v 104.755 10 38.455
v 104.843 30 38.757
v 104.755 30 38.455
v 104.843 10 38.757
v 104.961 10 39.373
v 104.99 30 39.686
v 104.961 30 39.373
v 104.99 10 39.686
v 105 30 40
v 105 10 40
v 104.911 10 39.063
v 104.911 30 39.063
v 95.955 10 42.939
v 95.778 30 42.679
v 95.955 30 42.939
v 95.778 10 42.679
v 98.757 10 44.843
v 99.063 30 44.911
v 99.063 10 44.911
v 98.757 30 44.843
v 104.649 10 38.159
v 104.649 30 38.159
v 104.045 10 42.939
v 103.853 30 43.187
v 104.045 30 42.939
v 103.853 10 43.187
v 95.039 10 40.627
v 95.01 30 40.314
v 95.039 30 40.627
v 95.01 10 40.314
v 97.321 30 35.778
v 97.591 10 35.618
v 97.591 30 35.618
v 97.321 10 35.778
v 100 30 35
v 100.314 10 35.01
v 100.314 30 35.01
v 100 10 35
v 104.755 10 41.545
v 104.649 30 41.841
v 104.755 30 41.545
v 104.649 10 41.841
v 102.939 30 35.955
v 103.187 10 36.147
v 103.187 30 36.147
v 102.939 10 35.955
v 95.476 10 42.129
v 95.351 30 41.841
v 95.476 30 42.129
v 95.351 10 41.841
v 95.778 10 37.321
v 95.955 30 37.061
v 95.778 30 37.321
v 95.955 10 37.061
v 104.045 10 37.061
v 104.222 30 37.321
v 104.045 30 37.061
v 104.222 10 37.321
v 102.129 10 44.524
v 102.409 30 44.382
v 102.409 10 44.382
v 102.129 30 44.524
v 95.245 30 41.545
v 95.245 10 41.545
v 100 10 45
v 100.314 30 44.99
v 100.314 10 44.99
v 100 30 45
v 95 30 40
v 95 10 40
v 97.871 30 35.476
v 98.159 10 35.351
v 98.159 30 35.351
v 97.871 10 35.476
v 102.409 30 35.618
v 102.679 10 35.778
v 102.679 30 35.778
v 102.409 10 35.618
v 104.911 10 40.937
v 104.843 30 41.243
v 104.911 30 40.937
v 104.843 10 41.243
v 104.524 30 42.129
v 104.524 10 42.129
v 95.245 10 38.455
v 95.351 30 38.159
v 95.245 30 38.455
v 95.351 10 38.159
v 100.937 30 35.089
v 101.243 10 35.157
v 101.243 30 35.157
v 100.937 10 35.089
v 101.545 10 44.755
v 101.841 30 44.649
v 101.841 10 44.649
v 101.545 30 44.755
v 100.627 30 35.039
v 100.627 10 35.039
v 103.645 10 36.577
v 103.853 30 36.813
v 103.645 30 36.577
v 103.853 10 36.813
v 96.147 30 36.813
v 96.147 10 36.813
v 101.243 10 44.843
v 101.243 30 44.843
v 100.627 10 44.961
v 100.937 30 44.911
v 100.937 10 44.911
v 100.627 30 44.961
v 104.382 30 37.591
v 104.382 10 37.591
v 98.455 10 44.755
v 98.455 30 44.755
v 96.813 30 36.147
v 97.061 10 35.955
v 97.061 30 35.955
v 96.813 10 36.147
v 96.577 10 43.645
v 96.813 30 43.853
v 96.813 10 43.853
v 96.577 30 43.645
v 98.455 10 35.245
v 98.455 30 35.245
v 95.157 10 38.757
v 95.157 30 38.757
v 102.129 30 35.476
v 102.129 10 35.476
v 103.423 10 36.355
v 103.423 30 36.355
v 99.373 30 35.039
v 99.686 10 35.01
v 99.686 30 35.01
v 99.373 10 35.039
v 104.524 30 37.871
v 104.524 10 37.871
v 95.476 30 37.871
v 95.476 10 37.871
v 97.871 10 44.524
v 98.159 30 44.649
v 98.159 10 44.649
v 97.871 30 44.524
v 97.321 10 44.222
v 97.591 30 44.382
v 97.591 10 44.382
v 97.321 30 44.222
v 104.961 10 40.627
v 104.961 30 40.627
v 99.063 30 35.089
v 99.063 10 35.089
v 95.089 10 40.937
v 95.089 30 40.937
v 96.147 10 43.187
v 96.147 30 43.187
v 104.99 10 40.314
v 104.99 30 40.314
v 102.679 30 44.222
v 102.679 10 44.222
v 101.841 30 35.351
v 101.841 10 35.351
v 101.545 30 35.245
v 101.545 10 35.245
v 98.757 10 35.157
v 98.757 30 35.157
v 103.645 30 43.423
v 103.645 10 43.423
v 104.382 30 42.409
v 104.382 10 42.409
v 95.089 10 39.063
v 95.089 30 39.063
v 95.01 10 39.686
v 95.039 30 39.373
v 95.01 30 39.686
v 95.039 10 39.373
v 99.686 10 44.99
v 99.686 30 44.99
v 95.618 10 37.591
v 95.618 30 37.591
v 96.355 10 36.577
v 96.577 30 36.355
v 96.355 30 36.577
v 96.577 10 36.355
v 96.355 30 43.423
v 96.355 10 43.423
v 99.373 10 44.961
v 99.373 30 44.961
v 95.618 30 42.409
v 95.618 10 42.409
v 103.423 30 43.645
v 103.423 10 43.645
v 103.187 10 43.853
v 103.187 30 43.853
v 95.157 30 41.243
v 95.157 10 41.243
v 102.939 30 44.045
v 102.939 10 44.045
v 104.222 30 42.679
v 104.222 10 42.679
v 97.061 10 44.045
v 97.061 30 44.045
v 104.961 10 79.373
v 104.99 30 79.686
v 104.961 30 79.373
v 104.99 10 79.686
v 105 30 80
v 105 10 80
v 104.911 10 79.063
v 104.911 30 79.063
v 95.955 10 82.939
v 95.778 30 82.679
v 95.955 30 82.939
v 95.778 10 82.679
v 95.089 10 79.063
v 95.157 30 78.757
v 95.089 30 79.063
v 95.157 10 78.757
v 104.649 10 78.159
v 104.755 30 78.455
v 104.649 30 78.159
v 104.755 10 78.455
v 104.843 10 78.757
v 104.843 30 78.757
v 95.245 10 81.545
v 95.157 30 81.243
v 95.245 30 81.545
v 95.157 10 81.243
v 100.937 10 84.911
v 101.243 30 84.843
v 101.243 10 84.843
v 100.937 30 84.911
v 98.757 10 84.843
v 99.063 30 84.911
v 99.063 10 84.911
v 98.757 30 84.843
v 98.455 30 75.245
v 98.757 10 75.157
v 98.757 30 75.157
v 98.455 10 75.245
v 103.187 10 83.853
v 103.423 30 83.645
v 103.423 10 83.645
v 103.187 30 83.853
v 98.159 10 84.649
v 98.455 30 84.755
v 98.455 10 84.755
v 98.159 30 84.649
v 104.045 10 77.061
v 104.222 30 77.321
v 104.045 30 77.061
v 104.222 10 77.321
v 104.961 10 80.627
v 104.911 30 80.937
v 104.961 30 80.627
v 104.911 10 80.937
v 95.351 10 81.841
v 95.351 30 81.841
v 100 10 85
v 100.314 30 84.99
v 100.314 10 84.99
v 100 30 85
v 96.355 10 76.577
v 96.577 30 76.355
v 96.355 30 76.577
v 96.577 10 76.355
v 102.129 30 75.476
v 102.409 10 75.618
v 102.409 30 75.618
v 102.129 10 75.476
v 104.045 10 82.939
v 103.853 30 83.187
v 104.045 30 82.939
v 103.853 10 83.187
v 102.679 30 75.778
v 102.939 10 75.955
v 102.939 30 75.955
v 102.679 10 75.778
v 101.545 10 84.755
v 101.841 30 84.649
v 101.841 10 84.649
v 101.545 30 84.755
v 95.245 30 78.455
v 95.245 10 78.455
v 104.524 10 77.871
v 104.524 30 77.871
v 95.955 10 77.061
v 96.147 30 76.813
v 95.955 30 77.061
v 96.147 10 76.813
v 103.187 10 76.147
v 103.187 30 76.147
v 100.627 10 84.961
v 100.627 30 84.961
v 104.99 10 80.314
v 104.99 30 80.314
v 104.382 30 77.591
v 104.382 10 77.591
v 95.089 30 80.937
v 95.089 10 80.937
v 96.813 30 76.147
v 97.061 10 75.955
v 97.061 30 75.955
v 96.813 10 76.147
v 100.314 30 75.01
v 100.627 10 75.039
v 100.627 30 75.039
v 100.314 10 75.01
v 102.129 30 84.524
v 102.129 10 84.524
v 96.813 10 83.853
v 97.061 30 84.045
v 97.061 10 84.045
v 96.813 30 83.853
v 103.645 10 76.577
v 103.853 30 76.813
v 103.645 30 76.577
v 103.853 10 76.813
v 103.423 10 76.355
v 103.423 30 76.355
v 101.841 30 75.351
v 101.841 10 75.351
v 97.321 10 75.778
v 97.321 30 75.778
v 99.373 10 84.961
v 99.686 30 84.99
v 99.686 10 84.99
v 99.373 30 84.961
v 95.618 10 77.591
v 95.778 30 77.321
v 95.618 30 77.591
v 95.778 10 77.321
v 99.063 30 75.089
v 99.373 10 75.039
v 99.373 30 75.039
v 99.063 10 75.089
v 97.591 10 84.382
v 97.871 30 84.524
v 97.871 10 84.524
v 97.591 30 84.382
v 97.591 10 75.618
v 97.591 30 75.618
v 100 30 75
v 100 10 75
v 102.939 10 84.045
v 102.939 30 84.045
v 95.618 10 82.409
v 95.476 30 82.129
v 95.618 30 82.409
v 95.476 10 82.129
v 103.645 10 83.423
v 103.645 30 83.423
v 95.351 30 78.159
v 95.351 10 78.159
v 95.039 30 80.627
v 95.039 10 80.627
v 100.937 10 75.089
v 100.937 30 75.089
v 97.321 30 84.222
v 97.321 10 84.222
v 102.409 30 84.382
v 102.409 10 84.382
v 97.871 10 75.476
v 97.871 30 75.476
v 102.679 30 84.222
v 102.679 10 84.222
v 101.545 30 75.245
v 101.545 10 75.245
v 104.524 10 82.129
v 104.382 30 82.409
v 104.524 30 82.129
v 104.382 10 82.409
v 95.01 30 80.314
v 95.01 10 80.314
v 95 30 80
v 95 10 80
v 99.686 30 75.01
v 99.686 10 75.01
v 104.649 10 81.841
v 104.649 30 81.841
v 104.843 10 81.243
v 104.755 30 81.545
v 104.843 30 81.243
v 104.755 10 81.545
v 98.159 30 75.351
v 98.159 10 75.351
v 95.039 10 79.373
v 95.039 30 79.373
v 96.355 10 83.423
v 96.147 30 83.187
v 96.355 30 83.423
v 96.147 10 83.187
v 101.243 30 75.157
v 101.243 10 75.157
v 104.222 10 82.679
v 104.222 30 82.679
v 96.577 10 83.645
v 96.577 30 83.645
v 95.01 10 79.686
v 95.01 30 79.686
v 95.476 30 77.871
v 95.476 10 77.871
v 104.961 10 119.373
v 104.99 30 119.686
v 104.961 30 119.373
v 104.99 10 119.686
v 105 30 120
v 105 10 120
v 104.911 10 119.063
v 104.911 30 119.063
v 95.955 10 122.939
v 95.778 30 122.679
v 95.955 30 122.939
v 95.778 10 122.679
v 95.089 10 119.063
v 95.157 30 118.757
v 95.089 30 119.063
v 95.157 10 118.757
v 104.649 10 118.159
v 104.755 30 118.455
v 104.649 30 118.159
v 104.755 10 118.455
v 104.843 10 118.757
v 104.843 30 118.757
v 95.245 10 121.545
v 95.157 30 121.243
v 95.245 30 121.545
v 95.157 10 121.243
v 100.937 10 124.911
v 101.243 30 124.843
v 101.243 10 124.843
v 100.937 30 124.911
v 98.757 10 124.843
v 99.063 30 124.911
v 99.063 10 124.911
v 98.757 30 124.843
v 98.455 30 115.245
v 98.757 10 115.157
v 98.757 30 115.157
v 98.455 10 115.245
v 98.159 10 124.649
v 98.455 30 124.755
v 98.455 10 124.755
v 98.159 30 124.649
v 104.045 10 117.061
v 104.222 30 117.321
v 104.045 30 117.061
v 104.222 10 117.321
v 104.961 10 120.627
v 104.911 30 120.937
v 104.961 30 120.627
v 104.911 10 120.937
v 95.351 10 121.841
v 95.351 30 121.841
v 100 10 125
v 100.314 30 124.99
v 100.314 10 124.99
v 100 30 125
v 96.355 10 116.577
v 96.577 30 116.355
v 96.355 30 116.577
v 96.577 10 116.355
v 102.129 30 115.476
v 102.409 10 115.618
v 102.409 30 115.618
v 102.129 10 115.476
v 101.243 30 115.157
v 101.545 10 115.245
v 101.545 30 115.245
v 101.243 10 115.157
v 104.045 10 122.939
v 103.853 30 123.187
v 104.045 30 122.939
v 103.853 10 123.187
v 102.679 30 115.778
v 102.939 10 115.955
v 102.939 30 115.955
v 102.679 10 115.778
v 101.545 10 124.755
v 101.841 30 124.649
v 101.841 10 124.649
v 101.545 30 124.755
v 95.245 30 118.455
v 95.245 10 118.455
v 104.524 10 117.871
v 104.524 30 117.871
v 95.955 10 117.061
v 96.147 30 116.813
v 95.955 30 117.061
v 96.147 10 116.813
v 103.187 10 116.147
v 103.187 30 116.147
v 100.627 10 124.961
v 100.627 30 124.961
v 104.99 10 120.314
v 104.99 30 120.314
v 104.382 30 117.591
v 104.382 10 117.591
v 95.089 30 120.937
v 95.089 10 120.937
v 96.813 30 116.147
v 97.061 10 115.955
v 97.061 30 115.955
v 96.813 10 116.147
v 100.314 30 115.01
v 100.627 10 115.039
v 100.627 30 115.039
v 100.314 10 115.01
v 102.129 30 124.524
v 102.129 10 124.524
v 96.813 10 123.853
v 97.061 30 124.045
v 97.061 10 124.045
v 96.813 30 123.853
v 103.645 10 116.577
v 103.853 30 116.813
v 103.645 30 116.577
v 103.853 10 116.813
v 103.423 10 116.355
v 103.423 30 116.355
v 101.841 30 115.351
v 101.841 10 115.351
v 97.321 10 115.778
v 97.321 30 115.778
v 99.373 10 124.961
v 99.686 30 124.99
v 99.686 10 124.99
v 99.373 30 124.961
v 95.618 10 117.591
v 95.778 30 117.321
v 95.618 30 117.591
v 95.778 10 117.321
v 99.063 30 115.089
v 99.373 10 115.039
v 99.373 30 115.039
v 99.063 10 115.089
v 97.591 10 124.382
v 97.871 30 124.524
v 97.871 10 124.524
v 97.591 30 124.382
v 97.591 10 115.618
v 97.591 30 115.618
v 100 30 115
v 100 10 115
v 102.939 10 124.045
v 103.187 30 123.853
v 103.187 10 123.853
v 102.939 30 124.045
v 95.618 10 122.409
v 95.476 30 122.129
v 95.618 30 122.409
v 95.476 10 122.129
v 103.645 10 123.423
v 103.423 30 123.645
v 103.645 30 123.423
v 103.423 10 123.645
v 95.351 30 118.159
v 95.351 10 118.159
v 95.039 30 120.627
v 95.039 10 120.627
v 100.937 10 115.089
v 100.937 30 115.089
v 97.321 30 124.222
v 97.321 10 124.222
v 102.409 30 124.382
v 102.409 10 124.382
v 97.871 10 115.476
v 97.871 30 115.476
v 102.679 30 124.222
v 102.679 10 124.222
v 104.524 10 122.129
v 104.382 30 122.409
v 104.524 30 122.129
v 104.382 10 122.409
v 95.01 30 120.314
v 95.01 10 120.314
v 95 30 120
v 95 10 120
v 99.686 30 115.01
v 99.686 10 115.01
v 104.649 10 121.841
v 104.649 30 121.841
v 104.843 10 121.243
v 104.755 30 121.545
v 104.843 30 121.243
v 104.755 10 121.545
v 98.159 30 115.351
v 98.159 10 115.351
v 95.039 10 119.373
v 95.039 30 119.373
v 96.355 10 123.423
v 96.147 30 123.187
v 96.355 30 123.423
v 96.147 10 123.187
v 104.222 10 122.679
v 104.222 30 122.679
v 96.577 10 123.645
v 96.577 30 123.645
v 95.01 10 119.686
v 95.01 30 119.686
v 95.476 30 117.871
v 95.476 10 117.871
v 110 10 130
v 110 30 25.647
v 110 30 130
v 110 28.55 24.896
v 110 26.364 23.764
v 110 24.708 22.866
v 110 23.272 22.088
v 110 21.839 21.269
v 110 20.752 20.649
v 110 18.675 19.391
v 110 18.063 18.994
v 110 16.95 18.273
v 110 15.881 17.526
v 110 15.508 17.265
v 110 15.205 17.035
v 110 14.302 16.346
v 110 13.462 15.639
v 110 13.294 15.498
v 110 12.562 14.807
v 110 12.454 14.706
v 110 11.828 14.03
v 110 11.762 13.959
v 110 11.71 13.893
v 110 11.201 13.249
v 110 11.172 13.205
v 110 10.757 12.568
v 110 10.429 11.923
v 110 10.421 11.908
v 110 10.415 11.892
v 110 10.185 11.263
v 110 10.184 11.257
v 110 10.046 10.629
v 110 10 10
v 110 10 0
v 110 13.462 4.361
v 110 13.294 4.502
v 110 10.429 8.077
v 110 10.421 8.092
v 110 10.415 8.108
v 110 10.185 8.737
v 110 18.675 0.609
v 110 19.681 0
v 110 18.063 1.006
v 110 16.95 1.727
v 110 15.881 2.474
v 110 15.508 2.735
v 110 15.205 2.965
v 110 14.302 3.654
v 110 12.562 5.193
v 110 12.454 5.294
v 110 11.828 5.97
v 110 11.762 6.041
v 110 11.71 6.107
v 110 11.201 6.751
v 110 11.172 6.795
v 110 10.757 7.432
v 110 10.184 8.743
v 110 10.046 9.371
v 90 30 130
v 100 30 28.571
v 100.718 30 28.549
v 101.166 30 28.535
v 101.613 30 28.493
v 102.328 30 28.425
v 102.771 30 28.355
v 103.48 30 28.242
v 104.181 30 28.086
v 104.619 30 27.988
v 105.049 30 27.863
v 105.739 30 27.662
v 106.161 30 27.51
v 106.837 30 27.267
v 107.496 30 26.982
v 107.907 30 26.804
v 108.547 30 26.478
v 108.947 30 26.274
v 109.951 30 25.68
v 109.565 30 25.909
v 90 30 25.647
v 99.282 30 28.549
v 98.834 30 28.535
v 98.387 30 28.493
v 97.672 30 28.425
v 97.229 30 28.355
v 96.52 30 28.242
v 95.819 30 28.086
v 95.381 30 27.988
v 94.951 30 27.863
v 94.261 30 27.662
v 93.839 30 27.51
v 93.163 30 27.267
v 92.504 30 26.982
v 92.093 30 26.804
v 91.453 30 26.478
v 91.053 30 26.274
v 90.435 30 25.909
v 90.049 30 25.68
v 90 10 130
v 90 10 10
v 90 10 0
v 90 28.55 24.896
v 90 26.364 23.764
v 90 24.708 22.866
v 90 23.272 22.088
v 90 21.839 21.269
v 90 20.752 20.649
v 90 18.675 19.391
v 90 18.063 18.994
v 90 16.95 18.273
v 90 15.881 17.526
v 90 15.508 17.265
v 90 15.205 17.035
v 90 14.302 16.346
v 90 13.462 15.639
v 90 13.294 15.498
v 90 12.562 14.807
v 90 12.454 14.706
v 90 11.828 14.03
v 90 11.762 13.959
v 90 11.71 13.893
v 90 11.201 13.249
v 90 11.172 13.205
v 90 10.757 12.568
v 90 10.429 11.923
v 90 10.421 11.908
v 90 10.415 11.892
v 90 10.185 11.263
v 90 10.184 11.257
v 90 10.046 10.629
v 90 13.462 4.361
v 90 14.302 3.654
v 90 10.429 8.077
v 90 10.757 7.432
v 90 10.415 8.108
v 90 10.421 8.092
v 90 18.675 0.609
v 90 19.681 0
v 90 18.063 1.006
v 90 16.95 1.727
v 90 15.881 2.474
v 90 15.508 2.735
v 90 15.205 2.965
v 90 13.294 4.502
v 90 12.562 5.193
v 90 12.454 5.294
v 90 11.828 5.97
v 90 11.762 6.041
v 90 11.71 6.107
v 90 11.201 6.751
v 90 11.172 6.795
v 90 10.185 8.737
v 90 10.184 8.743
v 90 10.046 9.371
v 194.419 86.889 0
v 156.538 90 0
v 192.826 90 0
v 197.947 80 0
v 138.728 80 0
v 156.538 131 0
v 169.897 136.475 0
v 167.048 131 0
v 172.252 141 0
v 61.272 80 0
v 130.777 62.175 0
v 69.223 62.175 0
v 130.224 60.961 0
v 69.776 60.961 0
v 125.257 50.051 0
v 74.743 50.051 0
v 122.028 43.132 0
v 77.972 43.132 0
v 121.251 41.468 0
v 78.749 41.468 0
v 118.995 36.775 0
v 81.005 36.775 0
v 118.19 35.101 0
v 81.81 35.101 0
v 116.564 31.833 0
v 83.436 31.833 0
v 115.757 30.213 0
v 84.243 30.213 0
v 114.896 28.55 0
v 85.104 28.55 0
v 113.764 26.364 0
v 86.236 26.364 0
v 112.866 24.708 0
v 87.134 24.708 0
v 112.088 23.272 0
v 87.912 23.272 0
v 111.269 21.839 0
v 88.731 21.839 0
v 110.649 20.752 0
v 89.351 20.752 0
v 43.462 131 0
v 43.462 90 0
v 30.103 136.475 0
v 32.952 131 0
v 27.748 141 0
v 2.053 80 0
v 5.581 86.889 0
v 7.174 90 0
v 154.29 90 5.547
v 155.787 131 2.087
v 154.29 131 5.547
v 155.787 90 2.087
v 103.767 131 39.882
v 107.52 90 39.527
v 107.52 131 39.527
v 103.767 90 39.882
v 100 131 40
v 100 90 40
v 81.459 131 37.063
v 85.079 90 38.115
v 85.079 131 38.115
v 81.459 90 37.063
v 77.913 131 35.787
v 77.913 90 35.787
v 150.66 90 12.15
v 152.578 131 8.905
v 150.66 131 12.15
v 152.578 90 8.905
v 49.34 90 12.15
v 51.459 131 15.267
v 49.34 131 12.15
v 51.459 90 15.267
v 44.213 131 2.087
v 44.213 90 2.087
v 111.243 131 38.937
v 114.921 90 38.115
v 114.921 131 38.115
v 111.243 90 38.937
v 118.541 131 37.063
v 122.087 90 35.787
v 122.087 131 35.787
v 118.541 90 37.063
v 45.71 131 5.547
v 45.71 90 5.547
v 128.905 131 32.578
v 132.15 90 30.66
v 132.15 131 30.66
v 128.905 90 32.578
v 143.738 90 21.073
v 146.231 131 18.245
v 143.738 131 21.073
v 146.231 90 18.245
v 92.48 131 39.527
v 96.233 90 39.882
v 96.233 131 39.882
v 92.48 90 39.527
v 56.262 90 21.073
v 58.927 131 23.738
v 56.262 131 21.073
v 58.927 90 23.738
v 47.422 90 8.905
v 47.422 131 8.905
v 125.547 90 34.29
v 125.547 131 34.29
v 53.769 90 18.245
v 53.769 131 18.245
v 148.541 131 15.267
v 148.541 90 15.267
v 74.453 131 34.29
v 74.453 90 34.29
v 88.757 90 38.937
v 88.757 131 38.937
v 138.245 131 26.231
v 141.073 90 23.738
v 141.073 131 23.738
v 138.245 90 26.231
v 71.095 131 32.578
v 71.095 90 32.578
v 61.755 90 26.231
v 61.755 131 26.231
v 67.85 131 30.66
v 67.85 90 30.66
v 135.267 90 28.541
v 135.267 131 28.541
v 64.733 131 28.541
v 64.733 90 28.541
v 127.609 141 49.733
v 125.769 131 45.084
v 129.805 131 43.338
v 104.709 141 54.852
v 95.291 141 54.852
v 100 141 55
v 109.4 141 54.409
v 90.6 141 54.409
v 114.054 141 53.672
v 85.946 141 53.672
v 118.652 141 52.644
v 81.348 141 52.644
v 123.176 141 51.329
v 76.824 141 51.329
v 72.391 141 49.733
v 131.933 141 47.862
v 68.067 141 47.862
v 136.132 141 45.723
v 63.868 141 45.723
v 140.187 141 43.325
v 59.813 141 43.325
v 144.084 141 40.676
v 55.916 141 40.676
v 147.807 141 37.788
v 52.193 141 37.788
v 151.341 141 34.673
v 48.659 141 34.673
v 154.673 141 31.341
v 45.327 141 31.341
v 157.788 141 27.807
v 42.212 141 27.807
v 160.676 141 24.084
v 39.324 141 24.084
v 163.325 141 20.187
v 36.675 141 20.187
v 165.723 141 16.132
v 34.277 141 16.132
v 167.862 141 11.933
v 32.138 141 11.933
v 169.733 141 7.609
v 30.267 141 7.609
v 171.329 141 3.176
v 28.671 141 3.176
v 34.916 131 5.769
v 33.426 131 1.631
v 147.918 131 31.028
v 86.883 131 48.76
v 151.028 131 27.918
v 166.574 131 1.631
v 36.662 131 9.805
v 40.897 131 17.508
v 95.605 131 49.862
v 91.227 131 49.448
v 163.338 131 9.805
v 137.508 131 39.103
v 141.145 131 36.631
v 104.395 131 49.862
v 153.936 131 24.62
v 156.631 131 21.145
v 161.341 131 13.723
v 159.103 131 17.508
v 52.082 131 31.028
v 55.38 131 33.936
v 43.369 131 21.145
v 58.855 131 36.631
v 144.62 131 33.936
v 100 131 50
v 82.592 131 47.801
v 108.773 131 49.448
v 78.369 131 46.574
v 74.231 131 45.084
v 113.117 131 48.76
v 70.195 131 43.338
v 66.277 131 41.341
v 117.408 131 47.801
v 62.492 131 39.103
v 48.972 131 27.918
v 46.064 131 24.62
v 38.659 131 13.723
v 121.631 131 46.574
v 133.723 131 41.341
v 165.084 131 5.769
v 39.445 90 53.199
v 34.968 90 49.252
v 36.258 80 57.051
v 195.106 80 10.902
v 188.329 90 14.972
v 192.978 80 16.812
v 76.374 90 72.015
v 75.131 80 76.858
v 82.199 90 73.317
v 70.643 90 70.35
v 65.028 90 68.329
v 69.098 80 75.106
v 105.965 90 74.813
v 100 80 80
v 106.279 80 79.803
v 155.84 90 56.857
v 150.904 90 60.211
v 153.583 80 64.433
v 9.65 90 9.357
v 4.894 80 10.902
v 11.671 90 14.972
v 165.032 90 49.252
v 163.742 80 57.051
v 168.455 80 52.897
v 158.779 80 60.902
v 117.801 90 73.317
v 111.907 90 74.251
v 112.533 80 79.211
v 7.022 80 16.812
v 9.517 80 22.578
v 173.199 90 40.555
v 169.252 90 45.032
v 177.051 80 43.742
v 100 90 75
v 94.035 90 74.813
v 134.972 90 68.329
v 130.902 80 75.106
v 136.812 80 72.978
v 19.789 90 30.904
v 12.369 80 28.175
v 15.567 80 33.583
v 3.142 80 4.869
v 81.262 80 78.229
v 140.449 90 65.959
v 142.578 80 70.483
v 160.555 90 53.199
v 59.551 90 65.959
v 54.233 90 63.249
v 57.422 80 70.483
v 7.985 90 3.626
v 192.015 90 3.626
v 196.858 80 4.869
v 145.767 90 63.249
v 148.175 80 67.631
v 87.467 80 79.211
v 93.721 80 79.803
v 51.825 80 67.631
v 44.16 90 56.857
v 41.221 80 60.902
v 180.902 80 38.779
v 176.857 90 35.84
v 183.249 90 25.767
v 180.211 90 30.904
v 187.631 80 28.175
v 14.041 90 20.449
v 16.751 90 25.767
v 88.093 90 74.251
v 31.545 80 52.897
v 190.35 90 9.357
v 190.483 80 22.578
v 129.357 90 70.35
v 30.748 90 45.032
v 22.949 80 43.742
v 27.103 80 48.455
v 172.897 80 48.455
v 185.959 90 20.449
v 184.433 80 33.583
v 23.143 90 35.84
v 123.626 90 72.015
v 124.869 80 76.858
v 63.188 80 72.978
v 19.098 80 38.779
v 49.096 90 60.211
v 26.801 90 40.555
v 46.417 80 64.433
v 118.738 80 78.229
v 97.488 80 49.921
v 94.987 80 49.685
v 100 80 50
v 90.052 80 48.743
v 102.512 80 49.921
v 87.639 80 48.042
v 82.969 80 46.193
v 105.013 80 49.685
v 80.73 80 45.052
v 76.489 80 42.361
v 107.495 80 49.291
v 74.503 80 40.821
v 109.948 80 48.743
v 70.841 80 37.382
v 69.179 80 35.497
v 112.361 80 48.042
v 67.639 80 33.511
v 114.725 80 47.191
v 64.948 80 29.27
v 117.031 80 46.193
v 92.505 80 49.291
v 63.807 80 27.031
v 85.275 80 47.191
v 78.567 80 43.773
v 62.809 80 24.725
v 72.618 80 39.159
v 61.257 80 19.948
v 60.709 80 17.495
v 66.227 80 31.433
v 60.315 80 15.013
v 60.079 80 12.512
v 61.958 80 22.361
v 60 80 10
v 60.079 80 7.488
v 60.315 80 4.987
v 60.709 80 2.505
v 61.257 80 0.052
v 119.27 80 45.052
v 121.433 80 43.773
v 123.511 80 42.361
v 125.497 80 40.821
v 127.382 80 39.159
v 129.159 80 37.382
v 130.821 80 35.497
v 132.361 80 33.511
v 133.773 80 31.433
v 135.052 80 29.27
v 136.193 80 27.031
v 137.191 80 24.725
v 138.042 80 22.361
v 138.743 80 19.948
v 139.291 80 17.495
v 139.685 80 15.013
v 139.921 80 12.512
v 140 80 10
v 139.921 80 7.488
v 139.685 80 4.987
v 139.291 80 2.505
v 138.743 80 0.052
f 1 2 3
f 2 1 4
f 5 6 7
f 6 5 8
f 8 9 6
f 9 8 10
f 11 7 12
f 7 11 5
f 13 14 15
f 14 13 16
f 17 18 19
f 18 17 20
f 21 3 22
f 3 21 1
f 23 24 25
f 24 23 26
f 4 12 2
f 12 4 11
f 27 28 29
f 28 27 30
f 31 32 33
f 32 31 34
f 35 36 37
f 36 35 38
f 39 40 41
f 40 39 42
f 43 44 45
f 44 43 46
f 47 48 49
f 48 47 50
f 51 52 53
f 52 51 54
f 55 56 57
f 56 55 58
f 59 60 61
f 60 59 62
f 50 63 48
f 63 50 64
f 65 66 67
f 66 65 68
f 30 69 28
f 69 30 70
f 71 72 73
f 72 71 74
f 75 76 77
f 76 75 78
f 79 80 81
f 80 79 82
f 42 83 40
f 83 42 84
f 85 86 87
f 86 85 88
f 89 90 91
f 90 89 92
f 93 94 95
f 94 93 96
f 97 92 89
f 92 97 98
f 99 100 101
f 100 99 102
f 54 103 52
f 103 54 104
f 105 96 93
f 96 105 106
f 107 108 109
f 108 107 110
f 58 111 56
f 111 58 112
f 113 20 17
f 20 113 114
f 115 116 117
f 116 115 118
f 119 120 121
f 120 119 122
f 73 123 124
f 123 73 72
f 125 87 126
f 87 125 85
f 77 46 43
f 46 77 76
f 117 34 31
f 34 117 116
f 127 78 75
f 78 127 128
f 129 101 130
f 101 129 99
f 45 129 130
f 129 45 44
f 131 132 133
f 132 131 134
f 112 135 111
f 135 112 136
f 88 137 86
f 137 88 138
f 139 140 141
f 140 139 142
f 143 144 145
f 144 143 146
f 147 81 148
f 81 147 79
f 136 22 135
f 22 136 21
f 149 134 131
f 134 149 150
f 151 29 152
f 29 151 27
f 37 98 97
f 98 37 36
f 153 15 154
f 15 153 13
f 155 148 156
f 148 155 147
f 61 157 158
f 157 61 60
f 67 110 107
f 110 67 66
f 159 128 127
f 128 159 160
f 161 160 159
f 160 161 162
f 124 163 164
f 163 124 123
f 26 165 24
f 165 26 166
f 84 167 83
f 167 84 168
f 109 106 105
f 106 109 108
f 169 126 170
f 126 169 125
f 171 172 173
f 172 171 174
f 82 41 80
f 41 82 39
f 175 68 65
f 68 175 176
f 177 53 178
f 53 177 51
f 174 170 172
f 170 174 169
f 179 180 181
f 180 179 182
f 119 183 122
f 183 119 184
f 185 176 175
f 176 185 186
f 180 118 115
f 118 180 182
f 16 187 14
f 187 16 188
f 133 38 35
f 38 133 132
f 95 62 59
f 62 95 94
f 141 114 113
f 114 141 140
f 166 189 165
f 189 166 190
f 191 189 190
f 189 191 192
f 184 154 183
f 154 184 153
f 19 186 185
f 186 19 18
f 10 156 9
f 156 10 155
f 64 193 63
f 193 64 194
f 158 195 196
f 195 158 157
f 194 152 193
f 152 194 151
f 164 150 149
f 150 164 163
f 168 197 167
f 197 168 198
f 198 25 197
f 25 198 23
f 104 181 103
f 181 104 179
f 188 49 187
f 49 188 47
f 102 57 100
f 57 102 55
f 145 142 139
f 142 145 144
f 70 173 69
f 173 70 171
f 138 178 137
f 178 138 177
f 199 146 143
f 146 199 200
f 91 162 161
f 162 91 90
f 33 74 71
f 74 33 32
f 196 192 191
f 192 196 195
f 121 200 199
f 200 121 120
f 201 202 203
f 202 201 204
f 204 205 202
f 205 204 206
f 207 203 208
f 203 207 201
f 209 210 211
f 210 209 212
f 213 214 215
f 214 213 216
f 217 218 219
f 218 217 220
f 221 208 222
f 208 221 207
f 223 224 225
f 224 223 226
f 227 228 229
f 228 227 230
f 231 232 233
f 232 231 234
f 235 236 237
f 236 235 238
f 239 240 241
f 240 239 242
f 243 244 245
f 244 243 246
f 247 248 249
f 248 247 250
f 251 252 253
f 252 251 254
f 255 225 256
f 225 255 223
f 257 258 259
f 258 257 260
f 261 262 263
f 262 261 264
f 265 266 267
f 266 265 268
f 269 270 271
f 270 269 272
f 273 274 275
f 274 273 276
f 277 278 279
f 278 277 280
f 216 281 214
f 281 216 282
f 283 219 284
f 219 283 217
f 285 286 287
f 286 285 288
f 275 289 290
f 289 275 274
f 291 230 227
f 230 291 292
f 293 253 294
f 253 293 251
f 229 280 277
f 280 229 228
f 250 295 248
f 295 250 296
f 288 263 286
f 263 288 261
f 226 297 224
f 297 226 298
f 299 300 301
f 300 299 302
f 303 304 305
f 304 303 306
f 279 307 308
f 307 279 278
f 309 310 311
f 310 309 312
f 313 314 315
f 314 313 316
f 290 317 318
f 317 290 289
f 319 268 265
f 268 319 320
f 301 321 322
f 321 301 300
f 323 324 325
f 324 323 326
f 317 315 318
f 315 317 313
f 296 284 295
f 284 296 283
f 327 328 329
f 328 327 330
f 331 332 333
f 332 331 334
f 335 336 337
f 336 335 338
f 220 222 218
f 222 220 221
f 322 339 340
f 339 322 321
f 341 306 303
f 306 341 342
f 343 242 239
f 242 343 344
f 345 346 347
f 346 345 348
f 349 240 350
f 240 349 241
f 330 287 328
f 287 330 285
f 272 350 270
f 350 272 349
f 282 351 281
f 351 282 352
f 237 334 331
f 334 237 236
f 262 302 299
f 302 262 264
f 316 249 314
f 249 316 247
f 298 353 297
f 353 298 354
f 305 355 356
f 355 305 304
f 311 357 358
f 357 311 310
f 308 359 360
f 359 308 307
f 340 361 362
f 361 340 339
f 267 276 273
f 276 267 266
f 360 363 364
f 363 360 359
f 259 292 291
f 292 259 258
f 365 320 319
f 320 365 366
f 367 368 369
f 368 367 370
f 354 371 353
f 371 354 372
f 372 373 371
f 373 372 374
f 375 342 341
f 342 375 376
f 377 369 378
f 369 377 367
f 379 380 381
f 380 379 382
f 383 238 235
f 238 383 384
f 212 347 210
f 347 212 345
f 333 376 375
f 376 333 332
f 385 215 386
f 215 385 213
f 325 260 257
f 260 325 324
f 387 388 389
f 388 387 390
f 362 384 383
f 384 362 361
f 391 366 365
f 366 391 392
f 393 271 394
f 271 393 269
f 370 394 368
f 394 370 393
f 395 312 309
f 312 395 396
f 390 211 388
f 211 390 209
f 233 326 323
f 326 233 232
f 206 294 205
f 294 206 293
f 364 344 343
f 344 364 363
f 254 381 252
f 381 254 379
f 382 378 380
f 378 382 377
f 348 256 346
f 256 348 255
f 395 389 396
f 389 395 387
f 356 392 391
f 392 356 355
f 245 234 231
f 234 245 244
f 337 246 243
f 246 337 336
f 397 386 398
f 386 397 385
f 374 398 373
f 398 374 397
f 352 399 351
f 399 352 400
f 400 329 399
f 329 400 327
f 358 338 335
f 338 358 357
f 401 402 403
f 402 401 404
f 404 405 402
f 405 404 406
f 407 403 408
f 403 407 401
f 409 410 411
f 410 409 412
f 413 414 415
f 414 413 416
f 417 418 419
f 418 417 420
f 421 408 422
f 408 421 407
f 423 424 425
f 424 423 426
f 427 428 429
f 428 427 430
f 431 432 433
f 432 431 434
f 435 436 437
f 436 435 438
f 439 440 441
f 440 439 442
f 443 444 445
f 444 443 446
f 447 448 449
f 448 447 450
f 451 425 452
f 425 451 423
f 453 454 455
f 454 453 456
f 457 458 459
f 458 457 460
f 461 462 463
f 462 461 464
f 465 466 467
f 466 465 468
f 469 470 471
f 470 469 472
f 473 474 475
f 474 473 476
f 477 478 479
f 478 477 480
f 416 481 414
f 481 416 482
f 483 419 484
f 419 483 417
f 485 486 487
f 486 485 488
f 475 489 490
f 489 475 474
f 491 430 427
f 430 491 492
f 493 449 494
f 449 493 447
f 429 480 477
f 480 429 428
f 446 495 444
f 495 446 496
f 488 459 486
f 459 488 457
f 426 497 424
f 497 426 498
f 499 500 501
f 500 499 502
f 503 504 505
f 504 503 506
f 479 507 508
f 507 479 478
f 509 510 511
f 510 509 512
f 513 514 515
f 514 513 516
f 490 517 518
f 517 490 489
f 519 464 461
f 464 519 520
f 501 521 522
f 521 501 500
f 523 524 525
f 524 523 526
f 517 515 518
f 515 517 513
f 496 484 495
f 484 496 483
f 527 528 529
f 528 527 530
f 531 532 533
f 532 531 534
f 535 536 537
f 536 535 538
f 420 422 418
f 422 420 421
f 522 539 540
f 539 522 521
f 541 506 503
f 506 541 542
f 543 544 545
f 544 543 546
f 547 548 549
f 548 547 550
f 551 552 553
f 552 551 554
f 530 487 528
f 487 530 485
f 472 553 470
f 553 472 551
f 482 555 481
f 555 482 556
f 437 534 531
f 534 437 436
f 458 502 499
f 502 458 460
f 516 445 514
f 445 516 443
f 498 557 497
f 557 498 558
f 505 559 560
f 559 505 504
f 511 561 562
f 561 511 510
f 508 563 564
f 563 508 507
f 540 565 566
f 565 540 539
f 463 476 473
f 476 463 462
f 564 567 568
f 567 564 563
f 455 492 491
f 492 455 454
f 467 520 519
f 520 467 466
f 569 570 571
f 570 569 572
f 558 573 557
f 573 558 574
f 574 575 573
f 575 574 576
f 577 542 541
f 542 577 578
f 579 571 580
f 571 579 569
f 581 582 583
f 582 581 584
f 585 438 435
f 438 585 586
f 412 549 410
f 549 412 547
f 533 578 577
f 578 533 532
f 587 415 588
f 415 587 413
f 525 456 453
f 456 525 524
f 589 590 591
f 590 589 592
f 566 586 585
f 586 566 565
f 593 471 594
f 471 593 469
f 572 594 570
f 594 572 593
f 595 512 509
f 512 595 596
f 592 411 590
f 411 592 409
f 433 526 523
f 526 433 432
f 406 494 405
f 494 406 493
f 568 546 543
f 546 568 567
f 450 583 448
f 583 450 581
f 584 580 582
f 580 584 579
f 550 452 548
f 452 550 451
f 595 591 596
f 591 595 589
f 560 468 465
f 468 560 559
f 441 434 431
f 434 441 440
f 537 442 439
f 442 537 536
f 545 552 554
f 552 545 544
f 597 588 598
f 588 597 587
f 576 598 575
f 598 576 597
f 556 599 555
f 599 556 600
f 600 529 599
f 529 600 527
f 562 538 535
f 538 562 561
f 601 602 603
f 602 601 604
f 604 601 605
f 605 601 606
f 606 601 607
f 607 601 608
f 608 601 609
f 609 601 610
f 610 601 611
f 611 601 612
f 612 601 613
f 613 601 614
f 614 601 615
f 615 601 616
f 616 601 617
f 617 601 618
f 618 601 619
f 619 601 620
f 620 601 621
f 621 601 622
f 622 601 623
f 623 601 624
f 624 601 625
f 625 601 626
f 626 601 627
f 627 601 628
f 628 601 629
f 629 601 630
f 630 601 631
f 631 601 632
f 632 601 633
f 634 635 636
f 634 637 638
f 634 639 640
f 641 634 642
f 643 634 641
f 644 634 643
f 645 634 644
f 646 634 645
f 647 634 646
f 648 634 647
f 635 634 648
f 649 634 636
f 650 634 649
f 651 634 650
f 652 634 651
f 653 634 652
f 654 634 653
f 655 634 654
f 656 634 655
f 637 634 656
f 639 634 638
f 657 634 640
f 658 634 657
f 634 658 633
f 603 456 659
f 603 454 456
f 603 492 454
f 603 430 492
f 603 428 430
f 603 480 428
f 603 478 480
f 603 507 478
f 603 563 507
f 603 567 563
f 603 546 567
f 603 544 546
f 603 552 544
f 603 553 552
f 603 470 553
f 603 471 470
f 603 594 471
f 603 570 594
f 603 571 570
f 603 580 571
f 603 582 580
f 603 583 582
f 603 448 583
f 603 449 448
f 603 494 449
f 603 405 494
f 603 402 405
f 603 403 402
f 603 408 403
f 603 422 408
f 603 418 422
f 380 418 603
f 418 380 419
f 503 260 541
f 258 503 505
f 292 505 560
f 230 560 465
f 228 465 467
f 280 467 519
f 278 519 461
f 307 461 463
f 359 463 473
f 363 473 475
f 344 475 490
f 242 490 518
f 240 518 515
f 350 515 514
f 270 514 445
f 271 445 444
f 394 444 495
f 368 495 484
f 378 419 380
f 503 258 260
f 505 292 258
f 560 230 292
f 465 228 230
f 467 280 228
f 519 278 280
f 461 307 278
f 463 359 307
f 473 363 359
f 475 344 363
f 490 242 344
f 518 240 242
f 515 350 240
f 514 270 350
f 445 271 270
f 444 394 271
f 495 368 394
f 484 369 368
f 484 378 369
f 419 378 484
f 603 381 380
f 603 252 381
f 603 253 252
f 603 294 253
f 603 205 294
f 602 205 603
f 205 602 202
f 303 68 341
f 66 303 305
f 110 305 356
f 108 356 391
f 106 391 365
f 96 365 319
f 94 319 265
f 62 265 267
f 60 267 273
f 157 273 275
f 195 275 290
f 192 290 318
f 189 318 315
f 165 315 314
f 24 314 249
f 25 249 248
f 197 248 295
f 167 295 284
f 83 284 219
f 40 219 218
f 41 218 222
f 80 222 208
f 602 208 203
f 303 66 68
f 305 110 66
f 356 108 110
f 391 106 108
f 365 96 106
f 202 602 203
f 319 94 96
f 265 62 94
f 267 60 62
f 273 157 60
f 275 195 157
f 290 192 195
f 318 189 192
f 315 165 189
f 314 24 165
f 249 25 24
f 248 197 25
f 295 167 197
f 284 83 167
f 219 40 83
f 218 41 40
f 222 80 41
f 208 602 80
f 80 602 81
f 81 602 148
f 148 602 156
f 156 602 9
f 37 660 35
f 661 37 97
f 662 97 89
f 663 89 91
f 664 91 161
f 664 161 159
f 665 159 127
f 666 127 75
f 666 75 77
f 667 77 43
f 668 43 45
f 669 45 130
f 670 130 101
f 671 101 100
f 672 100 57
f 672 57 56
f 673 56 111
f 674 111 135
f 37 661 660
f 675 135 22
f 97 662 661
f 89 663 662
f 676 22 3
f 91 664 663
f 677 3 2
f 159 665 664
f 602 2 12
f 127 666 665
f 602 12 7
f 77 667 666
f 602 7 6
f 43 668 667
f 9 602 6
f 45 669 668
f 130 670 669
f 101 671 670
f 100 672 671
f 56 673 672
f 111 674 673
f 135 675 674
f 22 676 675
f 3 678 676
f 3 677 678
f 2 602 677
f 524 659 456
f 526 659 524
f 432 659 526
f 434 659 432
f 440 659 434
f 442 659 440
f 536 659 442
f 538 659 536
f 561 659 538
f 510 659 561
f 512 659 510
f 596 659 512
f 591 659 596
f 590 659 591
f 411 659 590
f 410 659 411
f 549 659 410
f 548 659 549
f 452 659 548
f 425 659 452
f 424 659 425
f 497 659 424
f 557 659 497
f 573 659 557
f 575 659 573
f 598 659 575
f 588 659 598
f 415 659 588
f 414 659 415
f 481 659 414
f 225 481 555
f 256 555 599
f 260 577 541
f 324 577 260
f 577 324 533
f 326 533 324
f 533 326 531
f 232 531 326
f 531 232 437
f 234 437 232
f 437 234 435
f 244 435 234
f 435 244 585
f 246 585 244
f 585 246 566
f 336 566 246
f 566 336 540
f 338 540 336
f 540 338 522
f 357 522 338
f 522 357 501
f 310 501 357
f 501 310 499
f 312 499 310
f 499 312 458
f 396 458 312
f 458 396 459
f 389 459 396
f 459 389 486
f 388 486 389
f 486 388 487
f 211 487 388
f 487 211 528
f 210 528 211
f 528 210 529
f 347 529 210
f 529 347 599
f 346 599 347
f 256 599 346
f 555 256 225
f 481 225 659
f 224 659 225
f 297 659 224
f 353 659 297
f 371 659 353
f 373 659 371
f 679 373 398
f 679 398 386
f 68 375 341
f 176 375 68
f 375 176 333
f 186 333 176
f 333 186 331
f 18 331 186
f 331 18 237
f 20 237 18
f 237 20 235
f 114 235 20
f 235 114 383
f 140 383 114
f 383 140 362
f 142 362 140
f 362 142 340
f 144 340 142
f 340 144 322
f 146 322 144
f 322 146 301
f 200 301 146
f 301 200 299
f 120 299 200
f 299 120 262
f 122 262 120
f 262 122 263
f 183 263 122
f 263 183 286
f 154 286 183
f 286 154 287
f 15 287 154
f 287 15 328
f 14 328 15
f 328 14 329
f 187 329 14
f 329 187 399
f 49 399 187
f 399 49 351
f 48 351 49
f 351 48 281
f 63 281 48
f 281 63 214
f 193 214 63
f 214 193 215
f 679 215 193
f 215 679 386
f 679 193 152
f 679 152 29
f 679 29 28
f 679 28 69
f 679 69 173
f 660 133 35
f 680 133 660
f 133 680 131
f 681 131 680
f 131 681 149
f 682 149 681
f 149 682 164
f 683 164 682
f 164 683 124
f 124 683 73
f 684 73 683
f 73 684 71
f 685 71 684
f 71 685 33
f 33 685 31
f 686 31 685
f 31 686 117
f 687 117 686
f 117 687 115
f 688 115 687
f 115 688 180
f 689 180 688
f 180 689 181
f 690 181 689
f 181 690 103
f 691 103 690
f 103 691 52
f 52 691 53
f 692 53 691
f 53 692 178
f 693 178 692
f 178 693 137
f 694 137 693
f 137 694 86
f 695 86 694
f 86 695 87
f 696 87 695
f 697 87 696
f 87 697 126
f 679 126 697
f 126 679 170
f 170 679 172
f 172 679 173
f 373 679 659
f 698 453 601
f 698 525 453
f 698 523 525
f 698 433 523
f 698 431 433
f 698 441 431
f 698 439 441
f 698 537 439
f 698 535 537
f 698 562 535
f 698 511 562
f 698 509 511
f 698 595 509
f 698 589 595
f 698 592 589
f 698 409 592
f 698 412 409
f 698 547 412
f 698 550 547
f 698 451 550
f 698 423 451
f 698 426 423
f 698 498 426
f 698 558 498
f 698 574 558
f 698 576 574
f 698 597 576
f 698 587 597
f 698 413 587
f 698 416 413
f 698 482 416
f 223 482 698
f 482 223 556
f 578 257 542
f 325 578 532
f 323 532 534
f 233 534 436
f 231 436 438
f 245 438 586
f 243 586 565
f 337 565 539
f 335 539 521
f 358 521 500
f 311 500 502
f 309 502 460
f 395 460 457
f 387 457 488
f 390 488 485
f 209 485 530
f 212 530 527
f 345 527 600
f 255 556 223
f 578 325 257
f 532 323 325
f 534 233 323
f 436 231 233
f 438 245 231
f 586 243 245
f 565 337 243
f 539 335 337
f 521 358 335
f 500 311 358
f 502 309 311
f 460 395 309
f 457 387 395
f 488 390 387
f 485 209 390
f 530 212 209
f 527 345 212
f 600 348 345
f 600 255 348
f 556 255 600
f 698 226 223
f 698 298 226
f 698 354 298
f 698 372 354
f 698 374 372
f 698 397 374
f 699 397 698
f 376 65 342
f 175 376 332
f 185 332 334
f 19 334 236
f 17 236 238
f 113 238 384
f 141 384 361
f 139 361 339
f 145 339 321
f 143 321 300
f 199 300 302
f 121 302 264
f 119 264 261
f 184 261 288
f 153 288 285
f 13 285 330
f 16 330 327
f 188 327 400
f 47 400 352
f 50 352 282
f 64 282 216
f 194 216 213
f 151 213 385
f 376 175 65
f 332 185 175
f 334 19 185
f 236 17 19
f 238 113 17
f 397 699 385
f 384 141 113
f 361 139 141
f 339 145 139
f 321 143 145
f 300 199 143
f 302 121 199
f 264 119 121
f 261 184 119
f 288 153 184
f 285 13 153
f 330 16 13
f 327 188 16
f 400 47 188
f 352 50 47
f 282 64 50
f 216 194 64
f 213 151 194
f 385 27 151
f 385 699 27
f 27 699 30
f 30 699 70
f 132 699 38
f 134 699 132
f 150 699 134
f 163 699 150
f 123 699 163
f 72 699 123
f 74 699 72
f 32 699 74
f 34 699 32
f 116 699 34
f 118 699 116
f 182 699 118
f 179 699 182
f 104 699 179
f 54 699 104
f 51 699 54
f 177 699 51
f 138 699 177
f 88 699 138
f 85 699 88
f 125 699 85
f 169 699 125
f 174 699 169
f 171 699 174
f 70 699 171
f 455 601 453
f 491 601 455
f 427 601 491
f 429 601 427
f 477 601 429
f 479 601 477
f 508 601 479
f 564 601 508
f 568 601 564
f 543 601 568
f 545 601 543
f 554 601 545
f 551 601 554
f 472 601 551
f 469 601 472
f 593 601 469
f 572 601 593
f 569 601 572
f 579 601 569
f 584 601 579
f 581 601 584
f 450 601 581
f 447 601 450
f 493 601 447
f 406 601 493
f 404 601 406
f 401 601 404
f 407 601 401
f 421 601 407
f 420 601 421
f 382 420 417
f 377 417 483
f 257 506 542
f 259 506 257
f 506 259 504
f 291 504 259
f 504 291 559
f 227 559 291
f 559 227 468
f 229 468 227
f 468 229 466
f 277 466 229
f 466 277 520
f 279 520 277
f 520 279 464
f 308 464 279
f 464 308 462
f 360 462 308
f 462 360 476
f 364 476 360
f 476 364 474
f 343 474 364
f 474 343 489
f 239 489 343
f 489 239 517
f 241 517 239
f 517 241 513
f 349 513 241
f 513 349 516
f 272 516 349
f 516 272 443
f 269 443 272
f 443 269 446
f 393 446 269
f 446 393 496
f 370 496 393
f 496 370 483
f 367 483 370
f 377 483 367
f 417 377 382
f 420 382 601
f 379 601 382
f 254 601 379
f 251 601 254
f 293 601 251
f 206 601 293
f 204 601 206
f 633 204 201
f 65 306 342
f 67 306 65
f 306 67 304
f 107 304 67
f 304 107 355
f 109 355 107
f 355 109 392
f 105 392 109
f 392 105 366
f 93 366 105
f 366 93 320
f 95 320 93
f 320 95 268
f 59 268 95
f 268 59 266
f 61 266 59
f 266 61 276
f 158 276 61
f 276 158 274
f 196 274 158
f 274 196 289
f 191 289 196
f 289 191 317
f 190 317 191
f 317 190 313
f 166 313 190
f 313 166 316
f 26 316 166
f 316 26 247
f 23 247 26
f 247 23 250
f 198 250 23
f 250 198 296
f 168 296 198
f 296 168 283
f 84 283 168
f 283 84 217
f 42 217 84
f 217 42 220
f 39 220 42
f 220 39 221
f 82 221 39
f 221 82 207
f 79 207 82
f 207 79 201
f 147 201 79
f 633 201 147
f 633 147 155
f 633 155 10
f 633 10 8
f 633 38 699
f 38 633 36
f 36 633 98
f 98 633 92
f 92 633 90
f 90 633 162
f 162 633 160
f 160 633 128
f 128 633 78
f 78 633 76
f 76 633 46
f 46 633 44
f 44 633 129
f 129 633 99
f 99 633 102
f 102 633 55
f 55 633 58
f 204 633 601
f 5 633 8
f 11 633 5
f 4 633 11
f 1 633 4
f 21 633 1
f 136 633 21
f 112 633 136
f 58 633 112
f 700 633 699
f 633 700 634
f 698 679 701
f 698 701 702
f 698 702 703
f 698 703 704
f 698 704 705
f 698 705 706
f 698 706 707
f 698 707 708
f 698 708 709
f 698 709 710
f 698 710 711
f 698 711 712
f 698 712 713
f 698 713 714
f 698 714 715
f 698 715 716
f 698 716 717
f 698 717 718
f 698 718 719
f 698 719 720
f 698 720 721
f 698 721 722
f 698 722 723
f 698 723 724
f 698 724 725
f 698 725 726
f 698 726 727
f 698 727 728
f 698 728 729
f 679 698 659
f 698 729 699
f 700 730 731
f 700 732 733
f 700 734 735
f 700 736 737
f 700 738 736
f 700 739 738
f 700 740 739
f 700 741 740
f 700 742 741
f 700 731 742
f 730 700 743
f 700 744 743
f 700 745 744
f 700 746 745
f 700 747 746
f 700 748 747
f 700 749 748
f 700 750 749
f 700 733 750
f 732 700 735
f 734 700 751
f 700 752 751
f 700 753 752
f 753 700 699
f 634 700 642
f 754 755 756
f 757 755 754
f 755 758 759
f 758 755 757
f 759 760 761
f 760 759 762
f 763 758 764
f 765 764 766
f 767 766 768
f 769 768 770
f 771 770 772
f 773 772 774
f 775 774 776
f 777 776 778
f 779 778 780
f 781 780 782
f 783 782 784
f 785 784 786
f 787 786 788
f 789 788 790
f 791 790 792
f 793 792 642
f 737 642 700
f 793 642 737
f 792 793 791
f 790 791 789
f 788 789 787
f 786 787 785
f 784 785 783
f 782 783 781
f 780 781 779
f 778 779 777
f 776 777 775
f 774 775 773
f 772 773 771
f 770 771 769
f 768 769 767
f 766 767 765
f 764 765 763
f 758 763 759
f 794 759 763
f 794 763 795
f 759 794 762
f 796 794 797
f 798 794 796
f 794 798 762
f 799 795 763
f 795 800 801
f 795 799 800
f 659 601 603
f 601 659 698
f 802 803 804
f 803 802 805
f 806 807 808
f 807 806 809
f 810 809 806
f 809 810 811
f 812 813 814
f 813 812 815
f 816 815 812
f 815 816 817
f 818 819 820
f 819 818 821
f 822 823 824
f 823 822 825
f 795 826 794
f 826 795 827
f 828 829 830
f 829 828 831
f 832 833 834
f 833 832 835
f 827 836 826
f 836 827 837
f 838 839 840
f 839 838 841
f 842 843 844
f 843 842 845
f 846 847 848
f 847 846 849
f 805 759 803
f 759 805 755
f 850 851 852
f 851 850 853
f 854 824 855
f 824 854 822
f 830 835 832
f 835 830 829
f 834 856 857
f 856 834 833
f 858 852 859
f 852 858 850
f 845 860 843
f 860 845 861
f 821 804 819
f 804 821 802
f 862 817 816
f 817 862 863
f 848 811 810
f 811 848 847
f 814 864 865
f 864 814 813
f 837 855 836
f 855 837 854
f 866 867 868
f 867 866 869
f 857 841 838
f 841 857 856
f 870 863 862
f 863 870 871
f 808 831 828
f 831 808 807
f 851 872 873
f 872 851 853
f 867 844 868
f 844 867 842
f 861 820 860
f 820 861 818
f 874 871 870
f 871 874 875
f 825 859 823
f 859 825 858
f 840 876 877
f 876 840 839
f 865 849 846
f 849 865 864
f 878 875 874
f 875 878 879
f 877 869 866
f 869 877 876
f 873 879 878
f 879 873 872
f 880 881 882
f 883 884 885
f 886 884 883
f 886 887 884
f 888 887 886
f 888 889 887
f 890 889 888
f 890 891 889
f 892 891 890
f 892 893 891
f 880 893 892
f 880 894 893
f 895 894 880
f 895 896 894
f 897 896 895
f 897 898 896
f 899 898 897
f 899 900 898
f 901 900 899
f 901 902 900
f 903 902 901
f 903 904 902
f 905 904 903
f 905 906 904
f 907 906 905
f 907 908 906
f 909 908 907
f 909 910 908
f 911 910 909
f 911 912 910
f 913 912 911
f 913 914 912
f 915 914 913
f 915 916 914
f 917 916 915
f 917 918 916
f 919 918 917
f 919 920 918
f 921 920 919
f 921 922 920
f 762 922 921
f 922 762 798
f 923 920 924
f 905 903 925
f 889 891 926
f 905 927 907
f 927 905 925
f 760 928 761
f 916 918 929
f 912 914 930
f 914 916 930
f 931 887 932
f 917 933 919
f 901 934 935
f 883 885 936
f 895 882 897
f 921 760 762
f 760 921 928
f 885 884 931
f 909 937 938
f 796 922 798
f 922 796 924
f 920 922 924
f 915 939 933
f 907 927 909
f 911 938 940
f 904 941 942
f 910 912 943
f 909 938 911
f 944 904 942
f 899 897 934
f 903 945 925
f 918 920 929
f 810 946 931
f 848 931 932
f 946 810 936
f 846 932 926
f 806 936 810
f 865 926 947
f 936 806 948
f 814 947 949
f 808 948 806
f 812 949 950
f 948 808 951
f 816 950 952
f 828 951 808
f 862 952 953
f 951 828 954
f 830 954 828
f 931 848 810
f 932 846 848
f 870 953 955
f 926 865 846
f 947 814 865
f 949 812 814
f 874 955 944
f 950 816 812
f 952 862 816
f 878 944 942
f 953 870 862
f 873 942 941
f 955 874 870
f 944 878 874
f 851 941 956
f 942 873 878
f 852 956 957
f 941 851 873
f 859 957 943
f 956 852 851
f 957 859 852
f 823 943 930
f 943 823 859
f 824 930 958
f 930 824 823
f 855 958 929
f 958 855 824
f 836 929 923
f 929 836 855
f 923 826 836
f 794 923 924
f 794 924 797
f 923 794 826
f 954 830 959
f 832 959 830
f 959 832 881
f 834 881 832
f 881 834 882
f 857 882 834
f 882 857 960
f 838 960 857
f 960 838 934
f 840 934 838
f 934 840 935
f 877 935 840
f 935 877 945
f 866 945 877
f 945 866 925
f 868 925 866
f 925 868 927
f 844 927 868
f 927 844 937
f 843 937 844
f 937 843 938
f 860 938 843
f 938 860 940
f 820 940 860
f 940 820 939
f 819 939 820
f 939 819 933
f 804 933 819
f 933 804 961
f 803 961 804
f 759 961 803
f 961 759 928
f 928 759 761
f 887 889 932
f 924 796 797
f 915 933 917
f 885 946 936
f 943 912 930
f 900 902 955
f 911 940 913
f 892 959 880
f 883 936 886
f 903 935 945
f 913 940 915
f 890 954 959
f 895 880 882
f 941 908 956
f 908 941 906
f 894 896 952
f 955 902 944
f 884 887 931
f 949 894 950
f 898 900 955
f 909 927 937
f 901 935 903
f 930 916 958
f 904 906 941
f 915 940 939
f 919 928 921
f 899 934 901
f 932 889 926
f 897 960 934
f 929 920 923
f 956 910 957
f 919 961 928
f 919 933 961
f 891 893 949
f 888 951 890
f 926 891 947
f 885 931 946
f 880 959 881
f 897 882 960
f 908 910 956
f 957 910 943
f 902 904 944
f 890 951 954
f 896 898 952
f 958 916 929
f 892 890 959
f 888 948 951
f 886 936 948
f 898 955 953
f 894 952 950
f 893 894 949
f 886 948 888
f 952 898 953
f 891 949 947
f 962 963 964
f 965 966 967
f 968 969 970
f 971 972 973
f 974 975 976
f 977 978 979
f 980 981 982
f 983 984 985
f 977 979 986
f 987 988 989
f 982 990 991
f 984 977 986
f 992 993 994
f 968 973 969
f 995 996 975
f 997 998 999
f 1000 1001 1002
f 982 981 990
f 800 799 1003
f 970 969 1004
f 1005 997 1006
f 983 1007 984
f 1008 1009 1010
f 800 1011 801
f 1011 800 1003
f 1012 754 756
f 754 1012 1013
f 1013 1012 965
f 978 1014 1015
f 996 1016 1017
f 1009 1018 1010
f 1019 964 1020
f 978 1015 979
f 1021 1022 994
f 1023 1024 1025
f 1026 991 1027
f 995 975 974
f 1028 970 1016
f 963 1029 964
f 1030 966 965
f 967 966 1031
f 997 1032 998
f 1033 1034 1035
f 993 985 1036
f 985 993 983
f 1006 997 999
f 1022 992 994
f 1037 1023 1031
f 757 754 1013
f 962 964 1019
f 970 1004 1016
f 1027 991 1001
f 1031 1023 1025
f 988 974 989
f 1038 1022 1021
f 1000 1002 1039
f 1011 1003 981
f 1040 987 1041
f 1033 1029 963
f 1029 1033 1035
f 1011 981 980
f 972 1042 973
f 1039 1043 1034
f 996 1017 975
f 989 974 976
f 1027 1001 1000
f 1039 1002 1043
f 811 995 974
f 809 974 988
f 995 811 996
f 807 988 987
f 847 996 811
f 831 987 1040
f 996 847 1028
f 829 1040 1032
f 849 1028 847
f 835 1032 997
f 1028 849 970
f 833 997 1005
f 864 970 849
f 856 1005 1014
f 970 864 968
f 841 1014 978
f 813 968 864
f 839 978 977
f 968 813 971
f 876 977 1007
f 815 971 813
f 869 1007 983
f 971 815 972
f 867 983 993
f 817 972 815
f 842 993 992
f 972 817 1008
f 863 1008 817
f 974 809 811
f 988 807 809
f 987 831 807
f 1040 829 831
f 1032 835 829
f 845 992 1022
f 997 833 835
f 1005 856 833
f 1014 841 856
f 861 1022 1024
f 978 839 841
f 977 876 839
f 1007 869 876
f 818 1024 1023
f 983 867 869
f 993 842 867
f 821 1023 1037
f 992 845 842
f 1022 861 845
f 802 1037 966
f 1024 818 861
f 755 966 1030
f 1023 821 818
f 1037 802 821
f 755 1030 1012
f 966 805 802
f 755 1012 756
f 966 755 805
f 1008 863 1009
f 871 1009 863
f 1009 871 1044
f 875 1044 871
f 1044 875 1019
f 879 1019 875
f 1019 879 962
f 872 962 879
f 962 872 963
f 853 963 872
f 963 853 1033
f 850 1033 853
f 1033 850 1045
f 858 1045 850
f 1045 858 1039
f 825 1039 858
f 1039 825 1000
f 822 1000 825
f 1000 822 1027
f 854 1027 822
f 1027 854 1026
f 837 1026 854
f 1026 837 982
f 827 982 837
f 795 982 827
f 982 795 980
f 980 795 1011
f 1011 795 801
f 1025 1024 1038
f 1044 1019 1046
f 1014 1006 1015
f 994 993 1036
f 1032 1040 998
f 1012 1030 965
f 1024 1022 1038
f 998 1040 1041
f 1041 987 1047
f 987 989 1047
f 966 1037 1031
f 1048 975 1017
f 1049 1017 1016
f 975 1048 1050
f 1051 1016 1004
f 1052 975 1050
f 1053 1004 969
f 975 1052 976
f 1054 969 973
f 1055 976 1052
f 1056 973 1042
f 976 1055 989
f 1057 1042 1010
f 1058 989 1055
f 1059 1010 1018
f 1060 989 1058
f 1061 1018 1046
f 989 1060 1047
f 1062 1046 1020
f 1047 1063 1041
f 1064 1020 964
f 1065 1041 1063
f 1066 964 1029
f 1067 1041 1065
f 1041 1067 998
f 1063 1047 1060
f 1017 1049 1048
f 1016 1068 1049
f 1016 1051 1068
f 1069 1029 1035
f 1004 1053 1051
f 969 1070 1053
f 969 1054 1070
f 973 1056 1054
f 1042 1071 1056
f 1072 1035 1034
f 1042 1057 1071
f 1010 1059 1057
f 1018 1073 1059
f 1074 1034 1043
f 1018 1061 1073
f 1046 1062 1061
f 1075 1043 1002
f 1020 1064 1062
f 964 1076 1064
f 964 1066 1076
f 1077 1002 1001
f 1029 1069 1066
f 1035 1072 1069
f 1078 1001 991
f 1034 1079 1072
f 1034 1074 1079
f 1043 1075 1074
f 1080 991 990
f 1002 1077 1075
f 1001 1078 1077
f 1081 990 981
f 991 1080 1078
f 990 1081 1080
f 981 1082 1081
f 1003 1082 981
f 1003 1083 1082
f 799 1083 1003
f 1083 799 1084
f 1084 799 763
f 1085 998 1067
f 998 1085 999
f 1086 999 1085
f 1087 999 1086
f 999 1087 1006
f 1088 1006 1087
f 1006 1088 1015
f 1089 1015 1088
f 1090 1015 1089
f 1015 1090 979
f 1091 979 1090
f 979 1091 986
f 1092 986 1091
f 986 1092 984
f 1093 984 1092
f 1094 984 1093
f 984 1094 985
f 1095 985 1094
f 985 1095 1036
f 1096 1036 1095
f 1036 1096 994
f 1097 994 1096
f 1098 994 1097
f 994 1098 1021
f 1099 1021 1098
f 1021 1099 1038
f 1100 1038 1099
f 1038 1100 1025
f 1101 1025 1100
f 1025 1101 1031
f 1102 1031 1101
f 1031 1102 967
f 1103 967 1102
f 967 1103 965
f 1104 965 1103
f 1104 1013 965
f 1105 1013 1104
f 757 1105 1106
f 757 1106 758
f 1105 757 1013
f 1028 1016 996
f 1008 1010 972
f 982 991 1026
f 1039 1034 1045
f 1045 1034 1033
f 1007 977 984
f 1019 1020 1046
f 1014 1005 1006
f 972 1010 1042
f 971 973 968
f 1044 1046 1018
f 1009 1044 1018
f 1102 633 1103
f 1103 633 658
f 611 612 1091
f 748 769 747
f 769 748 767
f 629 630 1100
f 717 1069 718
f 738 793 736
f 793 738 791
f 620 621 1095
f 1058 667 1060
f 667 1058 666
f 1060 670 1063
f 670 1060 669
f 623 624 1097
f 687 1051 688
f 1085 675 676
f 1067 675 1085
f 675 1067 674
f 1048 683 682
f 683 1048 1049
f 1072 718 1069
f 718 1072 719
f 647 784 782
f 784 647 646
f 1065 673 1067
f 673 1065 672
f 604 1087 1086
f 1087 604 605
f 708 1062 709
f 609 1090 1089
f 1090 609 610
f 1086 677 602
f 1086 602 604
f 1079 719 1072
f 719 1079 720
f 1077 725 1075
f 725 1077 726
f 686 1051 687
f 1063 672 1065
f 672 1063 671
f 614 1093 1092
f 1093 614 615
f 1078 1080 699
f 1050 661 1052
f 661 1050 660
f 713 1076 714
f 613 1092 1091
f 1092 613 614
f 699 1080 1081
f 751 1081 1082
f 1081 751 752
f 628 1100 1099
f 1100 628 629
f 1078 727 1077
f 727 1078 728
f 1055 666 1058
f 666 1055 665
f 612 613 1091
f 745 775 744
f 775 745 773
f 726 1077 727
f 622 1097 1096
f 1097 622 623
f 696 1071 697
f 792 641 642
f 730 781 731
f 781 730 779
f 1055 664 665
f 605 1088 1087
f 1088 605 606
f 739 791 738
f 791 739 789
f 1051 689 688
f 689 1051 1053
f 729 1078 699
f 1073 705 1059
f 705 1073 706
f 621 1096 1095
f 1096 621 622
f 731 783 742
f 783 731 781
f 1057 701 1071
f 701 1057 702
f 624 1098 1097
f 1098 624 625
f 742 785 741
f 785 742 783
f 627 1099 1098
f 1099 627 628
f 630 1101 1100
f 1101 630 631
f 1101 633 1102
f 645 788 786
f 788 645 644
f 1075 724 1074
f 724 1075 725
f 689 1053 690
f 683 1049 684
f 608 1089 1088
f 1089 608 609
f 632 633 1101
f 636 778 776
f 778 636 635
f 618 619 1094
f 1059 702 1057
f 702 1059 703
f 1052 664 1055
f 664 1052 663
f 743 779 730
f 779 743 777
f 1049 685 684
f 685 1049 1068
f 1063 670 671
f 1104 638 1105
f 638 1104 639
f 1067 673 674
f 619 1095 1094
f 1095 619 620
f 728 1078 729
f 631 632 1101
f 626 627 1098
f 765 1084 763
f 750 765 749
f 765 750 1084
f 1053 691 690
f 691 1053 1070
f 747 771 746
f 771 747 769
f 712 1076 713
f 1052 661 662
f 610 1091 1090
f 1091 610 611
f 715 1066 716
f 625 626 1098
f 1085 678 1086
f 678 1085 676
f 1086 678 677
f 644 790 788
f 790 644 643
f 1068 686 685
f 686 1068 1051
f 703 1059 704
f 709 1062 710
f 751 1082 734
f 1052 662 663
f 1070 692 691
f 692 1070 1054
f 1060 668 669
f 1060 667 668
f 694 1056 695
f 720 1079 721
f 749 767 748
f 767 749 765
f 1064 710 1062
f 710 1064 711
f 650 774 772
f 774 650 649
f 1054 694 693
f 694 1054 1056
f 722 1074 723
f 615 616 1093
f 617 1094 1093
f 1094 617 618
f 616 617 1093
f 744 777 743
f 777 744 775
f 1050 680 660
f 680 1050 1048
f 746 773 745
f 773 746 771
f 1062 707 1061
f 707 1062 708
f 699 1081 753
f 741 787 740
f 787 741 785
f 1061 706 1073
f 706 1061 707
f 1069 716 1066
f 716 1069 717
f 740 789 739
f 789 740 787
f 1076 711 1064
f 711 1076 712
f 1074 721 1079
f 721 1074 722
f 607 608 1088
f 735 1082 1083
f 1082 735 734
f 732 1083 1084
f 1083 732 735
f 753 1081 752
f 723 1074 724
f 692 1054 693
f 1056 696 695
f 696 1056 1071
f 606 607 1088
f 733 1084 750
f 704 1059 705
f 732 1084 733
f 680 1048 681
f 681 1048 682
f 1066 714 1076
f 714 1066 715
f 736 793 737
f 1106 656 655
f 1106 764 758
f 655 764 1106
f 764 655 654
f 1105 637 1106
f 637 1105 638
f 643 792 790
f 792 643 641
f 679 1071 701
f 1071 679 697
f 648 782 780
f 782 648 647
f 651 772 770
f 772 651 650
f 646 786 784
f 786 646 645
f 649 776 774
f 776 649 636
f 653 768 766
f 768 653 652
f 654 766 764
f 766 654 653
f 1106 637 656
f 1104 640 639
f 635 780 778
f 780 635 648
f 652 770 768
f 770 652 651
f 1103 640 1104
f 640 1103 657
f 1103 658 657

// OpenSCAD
$fn = 100;

translate([100,10,0])
difference()
{
rotate([-90,0,0])
{
difference()
{

    translate([0,-65,10])
        cube([20,130, 20], center=true);
    
    translate([0,-40,0])
    union()
    {
        cylinder(50, r=5, center=true);
        
        translate([0,-40,0])
            cylinder(50, r=5, center = true);
        
        translate([0,-80,0])
            cylinder(50, r=5, center = true);
                
        
    }
    
}

    translate([0,-10,35])
        cylinder(70,r2=40,r1=10,center=true);
difference()
{
    translate([0,20,65])
    union()
    {
        {
            color("indigo",1.0)
            cylinder(130, r=60, center=true);
        }
        
        translate([0,0,61])
        {
            
            cylinder(10, r1=70,r2=75, center=true);
        }
        
        translate([0,0,10])
        {
            cylinder(10, r2=95,r1=100, center=true);
        }
       
    }
    
    cube([200,200,140],center=true);
}
}

translate([-200,-200,-200])
    cube([400,400,200]);

}
